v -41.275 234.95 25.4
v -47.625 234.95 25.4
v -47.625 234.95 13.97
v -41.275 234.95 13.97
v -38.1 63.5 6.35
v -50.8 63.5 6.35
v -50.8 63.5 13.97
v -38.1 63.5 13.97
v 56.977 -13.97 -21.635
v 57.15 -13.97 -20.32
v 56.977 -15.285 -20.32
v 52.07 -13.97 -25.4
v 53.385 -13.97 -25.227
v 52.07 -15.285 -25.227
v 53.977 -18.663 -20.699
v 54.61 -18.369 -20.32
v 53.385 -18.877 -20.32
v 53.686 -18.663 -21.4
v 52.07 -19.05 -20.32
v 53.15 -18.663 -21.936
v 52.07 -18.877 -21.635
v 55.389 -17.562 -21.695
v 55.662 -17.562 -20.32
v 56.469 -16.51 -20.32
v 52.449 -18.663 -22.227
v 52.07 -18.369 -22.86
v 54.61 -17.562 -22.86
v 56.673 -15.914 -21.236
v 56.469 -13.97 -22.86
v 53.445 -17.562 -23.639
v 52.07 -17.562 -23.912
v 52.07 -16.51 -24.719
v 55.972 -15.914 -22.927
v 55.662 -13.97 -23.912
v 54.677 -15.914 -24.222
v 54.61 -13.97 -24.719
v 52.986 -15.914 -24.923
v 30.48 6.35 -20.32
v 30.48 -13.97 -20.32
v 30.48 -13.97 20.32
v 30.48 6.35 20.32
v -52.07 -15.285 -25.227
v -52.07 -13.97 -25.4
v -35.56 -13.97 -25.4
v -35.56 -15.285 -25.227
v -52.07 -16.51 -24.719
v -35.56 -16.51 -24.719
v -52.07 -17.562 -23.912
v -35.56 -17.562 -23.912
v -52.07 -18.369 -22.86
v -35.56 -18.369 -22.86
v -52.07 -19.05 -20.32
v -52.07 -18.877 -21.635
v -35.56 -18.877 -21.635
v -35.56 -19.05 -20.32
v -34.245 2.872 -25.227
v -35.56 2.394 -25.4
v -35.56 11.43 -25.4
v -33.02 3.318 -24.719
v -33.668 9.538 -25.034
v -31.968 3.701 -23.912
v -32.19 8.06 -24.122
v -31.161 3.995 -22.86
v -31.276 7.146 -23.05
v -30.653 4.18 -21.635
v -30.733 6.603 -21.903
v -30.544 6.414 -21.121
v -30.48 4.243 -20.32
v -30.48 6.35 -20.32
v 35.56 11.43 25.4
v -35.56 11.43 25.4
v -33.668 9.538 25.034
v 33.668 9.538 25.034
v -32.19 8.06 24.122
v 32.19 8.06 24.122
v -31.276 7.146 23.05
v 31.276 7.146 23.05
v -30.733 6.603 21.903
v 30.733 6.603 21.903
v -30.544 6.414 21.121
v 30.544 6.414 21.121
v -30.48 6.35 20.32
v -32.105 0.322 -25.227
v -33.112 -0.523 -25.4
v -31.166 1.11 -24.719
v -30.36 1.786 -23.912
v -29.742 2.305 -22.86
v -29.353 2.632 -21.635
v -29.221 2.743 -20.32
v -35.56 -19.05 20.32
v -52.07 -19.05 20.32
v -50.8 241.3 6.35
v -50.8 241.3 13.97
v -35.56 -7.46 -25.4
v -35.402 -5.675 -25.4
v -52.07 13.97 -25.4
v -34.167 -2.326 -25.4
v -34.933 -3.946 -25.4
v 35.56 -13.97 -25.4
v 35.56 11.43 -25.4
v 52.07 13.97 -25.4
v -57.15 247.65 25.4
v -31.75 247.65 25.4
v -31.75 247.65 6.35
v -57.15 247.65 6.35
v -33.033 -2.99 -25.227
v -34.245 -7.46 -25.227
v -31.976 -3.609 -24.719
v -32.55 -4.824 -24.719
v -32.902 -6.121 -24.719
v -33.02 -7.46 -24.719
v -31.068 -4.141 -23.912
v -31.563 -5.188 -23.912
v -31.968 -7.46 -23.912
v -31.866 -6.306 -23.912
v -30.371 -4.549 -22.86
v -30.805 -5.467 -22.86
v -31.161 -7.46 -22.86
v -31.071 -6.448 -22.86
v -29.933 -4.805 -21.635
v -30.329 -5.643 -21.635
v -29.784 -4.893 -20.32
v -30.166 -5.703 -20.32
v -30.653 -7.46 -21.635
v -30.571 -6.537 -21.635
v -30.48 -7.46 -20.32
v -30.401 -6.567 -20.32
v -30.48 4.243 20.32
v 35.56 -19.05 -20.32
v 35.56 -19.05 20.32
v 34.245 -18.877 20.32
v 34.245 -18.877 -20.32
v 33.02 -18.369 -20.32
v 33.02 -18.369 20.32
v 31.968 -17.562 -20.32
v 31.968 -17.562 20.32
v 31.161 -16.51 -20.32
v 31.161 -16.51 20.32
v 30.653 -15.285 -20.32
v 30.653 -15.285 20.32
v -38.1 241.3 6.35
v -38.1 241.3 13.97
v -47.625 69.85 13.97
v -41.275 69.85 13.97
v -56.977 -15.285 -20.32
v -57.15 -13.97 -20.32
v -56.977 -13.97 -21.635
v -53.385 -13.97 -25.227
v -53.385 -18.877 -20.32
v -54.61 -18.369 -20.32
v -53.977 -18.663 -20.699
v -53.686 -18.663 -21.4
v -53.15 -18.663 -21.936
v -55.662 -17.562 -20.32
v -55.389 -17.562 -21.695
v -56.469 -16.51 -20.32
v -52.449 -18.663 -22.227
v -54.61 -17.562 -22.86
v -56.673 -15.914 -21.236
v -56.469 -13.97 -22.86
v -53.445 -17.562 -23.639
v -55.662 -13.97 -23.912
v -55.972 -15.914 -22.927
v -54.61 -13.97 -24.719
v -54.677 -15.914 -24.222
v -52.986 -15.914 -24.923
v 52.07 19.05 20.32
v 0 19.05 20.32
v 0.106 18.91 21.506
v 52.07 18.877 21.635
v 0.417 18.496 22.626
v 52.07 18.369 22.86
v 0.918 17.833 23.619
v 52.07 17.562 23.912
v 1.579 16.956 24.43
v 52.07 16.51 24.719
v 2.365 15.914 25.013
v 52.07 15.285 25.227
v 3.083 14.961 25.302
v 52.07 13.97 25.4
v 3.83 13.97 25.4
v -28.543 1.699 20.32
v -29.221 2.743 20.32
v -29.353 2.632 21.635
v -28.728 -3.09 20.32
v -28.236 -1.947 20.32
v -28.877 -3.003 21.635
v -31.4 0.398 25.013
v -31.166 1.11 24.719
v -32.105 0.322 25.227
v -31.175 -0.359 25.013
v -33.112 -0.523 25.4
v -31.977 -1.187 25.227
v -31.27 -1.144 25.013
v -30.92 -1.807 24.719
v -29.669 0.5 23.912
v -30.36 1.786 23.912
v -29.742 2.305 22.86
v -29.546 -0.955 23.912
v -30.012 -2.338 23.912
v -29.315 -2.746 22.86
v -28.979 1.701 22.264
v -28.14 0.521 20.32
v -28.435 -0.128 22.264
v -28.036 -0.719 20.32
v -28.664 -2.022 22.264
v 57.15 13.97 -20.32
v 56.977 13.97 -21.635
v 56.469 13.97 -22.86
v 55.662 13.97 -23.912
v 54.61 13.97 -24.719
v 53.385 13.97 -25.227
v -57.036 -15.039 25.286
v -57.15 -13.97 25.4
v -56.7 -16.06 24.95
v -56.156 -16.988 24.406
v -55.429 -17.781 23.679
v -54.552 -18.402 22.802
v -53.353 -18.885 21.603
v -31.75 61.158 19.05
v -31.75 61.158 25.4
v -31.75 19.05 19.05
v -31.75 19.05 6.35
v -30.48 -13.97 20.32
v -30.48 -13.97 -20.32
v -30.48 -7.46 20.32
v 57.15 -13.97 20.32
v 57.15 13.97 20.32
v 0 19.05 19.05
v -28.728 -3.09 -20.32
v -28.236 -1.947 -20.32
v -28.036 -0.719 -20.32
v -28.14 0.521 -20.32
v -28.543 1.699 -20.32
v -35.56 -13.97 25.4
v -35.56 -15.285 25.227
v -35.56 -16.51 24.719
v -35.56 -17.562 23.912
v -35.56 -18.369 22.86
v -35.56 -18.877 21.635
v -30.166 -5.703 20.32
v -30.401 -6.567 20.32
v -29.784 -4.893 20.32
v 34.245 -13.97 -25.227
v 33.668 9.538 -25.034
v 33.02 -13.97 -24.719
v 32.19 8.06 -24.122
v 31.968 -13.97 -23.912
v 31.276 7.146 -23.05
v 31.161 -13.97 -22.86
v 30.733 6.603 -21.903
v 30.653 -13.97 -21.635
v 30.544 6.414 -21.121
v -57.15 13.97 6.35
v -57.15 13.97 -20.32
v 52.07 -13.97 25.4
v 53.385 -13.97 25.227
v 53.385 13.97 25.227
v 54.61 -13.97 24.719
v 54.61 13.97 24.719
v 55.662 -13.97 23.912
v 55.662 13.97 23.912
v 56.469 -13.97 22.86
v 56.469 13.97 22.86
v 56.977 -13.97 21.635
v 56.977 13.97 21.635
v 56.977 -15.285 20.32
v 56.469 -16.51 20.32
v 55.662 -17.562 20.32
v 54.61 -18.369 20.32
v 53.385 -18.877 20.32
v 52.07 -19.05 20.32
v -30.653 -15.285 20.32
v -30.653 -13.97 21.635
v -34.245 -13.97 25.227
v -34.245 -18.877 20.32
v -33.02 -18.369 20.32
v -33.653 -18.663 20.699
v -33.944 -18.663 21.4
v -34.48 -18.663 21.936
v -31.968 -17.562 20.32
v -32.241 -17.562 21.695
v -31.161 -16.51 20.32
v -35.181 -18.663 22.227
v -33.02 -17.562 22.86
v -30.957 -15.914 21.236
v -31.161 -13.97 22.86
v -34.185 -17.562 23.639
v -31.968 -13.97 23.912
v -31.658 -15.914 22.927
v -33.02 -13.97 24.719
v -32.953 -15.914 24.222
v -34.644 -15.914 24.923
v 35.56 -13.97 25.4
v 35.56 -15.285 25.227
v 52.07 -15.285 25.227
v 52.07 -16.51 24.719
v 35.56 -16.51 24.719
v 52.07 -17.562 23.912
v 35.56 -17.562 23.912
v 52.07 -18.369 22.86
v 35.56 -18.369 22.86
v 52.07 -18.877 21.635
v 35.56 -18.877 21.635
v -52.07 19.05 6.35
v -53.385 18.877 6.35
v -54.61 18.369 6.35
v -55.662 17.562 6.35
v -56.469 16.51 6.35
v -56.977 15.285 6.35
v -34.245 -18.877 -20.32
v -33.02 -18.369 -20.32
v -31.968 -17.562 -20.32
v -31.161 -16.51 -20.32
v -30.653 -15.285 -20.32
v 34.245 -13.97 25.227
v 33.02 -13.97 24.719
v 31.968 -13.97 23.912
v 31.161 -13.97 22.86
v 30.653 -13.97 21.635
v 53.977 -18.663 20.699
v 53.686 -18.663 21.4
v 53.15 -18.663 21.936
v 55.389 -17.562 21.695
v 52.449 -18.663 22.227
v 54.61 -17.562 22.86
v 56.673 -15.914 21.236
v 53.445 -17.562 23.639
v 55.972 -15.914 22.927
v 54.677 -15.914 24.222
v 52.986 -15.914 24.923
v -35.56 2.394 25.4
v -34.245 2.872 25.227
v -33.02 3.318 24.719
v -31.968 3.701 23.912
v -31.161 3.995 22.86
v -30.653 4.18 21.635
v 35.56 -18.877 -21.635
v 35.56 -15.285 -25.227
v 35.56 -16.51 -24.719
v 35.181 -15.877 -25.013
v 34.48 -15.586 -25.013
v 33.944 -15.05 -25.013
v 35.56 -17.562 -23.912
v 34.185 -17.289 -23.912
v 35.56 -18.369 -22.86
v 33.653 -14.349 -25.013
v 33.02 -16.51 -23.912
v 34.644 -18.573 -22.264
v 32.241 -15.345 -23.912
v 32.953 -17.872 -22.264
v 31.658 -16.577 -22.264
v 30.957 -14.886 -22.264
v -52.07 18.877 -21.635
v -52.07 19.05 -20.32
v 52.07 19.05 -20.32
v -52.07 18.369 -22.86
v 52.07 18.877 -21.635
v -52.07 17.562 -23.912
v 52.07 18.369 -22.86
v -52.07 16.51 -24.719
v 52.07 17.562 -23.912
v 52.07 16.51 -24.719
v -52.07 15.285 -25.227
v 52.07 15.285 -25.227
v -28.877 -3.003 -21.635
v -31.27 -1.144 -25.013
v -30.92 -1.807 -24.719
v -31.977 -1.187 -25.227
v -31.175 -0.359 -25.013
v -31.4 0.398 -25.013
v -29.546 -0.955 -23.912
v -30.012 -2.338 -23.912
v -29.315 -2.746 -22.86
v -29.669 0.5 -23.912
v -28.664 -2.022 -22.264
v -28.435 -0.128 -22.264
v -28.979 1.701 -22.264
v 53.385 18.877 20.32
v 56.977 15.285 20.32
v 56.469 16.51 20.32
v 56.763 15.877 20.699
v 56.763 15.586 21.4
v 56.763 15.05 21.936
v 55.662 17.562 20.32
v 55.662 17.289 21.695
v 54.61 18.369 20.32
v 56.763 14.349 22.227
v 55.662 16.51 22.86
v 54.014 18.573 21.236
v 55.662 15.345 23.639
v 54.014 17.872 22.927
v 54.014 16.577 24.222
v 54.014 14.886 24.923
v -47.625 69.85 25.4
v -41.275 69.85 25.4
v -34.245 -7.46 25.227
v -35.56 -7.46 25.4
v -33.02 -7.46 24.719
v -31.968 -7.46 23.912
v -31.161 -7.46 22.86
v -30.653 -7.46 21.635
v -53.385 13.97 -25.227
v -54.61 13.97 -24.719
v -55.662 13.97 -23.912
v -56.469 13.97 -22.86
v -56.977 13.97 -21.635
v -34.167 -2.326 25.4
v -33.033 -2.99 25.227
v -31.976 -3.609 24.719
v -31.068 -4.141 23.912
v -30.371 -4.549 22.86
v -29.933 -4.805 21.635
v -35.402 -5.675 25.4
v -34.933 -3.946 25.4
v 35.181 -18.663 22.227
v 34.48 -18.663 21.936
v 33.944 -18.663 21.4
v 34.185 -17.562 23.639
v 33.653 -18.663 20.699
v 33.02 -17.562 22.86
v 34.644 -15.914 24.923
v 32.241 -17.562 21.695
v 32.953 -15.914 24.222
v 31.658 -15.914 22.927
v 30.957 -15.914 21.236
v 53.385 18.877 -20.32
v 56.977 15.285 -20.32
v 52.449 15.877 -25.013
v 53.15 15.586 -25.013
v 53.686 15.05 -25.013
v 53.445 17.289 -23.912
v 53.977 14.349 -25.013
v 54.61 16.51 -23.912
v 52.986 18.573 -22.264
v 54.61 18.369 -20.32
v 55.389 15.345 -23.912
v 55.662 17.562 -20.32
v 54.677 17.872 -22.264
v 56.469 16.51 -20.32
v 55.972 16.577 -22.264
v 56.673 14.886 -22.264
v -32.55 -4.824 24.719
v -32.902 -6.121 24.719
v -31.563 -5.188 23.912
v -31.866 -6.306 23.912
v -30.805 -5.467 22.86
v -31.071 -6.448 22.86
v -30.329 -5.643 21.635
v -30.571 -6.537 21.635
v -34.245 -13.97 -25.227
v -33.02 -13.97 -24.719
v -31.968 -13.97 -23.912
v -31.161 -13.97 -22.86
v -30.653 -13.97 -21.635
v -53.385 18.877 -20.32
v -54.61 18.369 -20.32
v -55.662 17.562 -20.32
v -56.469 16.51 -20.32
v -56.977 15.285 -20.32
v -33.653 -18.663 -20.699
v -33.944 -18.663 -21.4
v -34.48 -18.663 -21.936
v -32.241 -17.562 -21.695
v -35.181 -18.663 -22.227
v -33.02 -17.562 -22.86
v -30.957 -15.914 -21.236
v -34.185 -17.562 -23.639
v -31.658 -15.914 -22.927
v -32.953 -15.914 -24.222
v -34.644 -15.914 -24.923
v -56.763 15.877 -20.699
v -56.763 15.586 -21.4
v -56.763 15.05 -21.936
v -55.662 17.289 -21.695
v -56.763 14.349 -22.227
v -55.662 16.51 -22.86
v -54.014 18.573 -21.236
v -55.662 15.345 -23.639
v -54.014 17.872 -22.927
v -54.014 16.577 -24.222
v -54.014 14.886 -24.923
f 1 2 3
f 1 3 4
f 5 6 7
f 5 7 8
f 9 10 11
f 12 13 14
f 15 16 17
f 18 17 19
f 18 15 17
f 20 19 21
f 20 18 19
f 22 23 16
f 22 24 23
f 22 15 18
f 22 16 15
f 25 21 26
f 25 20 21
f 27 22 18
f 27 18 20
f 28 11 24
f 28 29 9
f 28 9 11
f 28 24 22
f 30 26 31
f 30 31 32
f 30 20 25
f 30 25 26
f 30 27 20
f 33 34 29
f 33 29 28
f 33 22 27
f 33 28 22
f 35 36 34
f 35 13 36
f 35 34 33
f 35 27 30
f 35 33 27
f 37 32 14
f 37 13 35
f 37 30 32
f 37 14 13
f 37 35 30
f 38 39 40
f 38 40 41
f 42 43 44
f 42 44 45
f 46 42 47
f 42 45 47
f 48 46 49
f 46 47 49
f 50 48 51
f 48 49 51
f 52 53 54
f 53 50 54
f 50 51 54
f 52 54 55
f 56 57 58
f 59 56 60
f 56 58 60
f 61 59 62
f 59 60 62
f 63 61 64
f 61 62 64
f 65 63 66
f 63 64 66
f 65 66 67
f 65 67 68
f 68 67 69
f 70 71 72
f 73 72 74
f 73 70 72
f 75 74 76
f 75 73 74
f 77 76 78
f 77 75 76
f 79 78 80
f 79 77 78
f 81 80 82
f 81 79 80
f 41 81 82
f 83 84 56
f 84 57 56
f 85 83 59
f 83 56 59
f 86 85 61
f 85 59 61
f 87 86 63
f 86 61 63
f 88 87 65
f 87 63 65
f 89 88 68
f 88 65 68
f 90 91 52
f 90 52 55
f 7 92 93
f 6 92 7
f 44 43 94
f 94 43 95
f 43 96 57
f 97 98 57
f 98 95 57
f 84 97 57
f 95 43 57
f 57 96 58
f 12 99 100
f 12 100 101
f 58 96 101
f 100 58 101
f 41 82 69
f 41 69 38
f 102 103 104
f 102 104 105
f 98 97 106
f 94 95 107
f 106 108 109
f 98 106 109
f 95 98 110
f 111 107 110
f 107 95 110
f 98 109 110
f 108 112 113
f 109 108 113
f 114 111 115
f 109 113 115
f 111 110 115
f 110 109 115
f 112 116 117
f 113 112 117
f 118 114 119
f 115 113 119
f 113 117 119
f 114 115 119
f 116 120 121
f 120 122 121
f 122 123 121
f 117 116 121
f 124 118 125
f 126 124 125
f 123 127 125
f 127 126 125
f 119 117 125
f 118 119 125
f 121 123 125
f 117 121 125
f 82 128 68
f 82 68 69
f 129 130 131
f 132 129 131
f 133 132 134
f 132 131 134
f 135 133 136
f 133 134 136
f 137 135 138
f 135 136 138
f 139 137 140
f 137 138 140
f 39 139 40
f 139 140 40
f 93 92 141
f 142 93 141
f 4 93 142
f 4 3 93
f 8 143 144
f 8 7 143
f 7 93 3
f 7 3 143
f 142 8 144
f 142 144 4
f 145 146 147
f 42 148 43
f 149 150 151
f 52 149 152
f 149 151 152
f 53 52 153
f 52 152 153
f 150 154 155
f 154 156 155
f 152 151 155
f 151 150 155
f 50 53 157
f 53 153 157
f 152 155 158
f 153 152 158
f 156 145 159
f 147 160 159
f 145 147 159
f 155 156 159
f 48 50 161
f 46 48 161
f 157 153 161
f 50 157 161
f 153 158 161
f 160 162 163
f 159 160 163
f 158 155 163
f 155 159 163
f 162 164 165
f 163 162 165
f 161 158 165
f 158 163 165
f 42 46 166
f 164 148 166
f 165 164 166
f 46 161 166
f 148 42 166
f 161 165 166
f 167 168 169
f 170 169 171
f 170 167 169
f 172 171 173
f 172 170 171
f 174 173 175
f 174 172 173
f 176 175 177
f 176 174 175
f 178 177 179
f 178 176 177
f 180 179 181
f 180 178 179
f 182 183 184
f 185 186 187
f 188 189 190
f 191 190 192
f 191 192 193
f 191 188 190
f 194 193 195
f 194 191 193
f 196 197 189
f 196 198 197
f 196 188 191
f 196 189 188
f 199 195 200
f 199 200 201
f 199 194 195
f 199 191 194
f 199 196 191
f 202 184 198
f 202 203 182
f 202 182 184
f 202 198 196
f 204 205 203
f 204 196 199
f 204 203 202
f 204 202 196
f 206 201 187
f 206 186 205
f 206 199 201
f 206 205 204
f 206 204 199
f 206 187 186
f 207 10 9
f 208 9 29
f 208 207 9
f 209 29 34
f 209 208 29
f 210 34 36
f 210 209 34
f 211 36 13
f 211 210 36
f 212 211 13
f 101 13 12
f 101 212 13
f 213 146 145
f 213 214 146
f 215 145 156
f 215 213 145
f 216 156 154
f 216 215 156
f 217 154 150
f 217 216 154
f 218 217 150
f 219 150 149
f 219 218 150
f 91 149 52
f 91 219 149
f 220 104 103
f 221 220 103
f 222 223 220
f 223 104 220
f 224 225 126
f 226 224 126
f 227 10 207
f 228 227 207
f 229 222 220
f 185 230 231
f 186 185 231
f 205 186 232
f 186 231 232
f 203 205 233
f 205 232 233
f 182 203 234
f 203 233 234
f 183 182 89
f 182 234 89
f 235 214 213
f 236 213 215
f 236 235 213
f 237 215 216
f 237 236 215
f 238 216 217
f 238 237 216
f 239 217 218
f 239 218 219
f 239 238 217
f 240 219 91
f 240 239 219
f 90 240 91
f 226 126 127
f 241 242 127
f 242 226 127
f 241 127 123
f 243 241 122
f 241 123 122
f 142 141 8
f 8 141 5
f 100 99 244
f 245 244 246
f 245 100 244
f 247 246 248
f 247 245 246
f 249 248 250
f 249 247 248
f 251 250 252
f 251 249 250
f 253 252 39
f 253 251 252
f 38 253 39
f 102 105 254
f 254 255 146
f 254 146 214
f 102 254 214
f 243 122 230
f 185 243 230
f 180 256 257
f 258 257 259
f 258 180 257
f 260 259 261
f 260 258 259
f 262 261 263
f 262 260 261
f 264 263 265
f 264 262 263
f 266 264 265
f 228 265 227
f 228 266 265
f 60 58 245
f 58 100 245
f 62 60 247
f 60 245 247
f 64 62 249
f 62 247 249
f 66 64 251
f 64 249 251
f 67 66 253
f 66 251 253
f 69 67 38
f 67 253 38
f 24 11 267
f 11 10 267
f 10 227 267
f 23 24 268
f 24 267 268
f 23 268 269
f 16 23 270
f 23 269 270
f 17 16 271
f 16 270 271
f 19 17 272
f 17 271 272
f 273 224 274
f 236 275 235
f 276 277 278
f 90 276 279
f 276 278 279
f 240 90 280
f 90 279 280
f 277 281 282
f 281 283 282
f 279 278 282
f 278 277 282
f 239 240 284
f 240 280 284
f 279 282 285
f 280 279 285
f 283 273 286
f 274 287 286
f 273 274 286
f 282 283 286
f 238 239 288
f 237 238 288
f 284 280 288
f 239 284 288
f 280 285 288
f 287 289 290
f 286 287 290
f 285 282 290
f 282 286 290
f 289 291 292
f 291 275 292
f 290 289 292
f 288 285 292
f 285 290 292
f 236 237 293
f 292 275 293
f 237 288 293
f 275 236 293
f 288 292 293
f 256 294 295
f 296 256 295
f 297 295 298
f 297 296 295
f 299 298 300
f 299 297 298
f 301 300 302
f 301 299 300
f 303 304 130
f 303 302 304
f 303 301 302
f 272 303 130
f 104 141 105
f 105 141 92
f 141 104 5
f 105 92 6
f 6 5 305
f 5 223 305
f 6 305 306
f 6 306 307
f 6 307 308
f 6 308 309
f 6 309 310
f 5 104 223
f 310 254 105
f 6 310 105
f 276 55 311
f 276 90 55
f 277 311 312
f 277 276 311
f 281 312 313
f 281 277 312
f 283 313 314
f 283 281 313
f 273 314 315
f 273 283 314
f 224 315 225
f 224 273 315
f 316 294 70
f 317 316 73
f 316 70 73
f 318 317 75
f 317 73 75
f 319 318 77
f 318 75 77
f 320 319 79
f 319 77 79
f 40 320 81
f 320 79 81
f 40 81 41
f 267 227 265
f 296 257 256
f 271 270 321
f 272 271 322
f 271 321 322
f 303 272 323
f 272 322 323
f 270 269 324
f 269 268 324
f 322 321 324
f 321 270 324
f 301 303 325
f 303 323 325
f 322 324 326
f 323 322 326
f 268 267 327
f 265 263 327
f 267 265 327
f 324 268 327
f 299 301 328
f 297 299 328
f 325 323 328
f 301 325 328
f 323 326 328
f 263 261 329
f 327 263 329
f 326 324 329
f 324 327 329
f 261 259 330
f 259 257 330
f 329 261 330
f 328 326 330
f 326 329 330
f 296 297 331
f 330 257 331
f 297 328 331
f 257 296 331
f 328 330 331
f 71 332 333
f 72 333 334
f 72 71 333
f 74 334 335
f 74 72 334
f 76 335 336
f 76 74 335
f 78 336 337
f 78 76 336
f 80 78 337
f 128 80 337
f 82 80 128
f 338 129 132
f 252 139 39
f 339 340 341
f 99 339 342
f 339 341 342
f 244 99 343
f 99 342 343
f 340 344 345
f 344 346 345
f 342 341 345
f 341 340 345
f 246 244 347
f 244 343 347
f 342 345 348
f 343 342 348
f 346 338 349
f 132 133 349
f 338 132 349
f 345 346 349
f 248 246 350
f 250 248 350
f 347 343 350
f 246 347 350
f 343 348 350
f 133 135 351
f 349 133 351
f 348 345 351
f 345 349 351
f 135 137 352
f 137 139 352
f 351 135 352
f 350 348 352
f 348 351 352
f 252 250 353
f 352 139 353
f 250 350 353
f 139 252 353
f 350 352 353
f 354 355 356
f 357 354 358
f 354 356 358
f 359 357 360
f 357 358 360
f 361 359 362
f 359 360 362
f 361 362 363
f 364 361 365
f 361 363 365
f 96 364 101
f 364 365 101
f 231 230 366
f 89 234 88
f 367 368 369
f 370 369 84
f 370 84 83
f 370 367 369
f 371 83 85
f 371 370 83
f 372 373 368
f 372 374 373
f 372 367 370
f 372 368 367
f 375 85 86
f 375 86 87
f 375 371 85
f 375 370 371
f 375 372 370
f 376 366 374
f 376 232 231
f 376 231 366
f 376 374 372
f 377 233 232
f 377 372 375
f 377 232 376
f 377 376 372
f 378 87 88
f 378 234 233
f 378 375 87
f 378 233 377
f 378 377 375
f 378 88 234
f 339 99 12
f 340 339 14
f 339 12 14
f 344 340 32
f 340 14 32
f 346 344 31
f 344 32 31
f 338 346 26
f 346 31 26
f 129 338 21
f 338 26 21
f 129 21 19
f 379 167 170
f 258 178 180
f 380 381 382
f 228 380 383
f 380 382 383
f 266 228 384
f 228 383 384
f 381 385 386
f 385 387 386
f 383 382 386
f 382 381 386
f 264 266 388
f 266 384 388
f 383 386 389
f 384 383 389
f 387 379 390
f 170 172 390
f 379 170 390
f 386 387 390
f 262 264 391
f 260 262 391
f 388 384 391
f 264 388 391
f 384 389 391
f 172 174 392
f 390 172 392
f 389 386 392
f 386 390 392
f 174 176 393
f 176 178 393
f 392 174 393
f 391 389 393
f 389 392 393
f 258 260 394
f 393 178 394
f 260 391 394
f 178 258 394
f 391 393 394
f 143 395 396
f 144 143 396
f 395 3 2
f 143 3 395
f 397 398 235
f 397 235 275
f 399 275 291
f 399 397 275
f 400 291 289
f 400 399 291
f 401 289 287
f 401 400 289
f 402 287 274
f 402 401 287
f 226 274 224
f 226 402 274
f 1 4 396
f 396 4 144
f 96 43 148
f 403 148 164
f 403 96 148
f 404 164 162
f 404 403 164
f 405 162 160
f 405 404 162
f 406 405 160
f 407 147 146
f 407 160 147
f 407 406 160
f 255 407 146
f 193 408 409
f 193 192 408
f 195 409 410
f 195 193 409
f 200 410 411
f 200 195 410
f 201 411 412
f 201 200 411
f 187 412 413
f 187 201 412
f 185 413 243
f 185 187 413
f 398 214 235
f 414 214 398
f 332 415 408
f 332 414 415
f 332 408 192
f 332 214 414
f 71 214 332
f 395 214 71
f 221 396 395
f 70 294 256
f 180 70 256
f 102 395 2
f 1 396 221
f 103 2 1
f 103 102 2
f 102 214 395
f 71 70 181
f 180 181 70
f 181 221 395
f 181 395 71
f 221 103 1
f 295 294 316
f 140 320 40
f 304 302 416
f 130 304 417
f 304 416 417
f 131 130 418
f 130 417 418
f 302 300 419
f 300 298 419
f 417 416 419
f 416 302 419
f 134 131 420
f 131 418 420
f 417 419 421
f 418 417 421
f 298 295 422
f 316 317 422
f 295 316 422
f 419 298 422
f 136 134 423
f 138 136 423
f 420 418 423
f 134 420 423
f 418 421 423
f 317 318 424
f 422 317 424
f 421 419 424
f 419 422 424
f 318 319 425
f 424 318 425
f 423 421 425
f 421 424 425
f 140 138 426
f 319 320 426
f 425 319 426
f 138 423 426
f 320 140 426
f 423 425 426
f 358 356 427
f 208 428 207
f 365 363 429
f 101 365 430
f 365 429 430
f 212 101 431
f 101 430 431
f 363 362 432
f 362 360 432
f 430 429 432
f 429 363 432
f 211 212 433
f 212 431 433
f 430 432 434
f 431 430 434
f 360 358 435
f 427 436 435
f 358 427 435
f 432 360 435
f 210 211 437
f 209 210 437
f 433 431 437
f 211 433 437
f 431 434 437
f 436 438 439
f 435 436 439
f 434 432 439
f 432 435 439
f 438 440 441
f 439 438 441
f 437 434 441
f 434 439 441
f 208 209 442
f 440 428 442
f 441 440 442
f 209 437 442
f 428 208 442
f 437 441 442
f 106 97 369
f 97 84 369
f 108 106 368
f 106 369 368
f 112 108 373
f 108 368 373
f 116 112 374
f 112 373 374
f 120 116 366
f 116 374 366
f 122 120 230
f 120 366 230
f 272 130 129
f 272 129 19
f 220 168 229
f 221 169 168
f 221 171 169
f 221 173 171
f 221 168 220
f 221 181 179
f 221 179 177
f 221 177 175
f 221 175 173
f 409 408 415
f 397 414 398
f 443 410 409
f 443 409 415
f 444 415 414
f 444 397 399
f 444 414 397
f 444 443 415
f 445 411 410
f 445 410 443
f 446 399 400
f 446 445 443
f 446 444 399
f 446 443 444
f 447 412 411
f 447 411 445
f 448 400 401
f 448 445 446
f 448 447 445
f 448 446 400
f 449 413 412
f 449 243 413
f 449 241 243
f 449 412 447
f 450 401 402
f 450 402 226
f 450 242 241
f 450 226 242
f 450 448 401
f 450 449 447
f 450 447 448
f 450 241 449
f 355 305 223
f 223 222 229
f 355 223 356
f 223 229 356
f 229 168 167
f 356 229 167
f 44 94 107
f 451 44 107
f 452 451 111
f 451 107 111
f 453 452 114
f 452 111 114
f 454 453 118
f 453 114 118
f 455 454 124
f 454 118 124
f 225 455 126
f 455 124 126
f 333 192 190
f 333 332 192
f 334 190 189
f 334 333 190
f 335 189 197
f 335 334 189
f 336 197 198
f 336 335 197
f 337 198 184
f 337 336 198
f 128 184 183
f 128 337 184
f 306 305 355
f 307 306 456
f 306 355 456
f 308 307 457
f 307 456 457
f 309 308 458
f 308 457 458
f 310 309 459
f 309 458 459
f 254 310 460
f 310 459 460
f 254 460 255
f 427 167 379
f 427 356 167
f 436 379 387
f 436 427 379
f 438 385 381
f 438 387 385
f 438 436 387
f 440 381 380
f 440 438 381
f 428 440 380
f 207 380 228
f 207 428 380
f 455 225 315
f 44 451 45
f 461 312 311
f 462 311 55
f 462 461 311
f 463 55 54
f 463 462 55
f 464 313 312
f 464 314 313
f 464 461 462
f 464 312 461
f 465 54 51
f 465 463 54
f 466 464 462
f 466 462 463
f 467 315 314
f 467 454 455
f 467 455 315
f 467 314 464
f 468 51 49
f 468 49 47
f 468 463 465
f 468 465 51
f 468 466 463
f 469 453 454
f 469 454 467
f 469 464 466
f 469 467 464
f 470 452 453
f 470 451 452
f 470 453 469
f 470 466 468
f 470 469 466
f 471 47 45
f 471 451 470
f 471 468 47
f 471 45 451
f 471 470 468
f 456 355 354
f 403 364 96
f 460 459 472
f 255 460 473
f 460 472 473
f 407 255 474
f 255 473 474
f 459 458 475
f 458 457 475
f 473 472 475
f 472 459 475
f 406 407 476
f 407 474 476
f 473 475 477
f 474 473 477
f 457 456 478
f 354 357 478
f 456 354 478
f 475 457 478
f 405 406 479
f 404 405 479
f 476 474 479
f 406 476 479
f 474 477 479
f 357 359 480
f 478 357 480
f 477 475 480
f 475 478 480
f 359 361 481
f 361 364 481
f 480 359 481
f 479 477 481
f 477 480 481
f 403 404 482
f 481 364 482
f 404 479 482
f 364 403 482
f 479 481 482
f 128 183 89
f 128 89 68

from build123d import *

# Parameters (mm, degrees)
F0_W      = 114.3
F0_H      = 38.1
F2_DEPTH  = 25.4
F1_W      = 60.96
F1_H      = 38.1
F3_DEPTH  = 38.1
F5_DEPTH  = 25.4
F6_W      = 25.4
F6_H      = 19.05
F7_DEPTH  = 228.6
F8_W      = 12.7
F8_H      = 177.8
F9_DEPTH  = 7.62
F10_W     = 6.35
F10_H     = 165.1
F11_DEPTH = 11.431
F13_DEPTH = 6.35
F14_R     = 5.08


with BuildPart() as f2:
    # F0 (on Top) → F2 (new body, symmetric)
    with BuildSketch(Plane.XY):
        Rectangle(F0_W, F0_H)
    extrude(amount=F2_DEPTH, both=True)

    # F1 (on face) → F3 (cut, symmetric)
    with BuildSketch(Plane.XY):
        with Locations((0, -12.7)):
            Rectangle(F1_W, F1_H)
    extrude(amount=F3_DEPTH, both=True, mode=Mode.SUBTRACT)

    # F4 (on Top) → F5 (join, symmetric)
    with BuildSketch(Plane.XY):
        Polygon((-26.9186757505, 0), (-30.5502526462, 4.3267654255), (-30.6185223162, -6.3184089959), align=None)
    extrude(amount=F5_DEPTH, both=True)

    # F6 (on face) → F7 (join)
    with BuildSketch(Plane(origin=(0, 19.05, 0), x_dir=(-1, 0, 0), z_dir=(0, 1, 0))):
        with Locations((44.45, 15.875)):
            Rectangle(F6_W, F6_H)
    extrude(amount=F7_DEPTH)

    # F8 (on face) → F9 (cut)
    with BuildSketch(Plane(origin=(0, 0, 6.35), x_dir=(1, 0, 0), z_dir=(0, 0, -1))):
        with Locations((-44.45, -152.4)):
            Rectangle(F8_W, F8_H)
    extrude(amount=-F9_DEPTH, mode=Mode.SUBTRACT)

    # F10 (on face) → F11 (cut, through all)
    with BuildSketch(Plane(origin=(0, 0, 13.97), x_dir=(1, 0, 0), z_dir=(0, 0, -1))):
        with Locations((-44.45, -152.4)):
            Rectangle(F10_W, F10_H)
    extrude(amount=-F11_DEPTH, mode=Mode.SUBTRACT)

    # F12 (on face) → F13 (join)
    with BuildSketch(Plane.XY.offset(25.4)):
        Polygon((0, 19.05), (-31.75, 61.1579380929), (-31.75, 19.05), align=None)
    extrude(amount=-F13_DEPTH)

    # F14
    f14_edges = [f2.edges().sort_by_distance(p)[0] for p in [
        (28.575, 19.05, 25.4),
        (57.15, 19.05, 0),
        (0, 19.05, -25.4),
        (-57.15, 19.05, -9.525),
        (-57.15, 0, -25.4),
        (-30.48, -12.565924, -25.4),
        (-57.15, -19.05, 0),
        (57.15, 0, 25.4),
        (57.15, 0, -25.4),
        (30.48, -6.35, 25.4),
        (57.15, -19.05, 0),
        (43.815, -19.05, 25.4),
        (30.48, -19.05, 0),
        (43.815, -19.05, -25.4),
        (0, 6.35, 25.4),
        (-30.48, 5.296532, 25.4),
        (-30.48, -12.565924, 25.4),
        (-30.48, -19.05, 0),
        (-43.815, -19.05, -25.4),
        (-43.815, -19.05, 25.4),
        (30.48, -6.35, -25.4),
        (-26.918676, 0, 0),
        (-28.699338, 2.121532, 25.4),
        (-30.48, -6.081848, 0),
        (-28.699338, -3.040924, 25.4),
        (0, 6.35, -25.4),
        (-28.699338, -3.040924, -25.4),
        (-28.699338, 2.121532, -25.4),
        (-30.48, 5.296532, -25.4),
    ]]
    fillet(f14_edges, radius=F14_R)


solid = f2.part
